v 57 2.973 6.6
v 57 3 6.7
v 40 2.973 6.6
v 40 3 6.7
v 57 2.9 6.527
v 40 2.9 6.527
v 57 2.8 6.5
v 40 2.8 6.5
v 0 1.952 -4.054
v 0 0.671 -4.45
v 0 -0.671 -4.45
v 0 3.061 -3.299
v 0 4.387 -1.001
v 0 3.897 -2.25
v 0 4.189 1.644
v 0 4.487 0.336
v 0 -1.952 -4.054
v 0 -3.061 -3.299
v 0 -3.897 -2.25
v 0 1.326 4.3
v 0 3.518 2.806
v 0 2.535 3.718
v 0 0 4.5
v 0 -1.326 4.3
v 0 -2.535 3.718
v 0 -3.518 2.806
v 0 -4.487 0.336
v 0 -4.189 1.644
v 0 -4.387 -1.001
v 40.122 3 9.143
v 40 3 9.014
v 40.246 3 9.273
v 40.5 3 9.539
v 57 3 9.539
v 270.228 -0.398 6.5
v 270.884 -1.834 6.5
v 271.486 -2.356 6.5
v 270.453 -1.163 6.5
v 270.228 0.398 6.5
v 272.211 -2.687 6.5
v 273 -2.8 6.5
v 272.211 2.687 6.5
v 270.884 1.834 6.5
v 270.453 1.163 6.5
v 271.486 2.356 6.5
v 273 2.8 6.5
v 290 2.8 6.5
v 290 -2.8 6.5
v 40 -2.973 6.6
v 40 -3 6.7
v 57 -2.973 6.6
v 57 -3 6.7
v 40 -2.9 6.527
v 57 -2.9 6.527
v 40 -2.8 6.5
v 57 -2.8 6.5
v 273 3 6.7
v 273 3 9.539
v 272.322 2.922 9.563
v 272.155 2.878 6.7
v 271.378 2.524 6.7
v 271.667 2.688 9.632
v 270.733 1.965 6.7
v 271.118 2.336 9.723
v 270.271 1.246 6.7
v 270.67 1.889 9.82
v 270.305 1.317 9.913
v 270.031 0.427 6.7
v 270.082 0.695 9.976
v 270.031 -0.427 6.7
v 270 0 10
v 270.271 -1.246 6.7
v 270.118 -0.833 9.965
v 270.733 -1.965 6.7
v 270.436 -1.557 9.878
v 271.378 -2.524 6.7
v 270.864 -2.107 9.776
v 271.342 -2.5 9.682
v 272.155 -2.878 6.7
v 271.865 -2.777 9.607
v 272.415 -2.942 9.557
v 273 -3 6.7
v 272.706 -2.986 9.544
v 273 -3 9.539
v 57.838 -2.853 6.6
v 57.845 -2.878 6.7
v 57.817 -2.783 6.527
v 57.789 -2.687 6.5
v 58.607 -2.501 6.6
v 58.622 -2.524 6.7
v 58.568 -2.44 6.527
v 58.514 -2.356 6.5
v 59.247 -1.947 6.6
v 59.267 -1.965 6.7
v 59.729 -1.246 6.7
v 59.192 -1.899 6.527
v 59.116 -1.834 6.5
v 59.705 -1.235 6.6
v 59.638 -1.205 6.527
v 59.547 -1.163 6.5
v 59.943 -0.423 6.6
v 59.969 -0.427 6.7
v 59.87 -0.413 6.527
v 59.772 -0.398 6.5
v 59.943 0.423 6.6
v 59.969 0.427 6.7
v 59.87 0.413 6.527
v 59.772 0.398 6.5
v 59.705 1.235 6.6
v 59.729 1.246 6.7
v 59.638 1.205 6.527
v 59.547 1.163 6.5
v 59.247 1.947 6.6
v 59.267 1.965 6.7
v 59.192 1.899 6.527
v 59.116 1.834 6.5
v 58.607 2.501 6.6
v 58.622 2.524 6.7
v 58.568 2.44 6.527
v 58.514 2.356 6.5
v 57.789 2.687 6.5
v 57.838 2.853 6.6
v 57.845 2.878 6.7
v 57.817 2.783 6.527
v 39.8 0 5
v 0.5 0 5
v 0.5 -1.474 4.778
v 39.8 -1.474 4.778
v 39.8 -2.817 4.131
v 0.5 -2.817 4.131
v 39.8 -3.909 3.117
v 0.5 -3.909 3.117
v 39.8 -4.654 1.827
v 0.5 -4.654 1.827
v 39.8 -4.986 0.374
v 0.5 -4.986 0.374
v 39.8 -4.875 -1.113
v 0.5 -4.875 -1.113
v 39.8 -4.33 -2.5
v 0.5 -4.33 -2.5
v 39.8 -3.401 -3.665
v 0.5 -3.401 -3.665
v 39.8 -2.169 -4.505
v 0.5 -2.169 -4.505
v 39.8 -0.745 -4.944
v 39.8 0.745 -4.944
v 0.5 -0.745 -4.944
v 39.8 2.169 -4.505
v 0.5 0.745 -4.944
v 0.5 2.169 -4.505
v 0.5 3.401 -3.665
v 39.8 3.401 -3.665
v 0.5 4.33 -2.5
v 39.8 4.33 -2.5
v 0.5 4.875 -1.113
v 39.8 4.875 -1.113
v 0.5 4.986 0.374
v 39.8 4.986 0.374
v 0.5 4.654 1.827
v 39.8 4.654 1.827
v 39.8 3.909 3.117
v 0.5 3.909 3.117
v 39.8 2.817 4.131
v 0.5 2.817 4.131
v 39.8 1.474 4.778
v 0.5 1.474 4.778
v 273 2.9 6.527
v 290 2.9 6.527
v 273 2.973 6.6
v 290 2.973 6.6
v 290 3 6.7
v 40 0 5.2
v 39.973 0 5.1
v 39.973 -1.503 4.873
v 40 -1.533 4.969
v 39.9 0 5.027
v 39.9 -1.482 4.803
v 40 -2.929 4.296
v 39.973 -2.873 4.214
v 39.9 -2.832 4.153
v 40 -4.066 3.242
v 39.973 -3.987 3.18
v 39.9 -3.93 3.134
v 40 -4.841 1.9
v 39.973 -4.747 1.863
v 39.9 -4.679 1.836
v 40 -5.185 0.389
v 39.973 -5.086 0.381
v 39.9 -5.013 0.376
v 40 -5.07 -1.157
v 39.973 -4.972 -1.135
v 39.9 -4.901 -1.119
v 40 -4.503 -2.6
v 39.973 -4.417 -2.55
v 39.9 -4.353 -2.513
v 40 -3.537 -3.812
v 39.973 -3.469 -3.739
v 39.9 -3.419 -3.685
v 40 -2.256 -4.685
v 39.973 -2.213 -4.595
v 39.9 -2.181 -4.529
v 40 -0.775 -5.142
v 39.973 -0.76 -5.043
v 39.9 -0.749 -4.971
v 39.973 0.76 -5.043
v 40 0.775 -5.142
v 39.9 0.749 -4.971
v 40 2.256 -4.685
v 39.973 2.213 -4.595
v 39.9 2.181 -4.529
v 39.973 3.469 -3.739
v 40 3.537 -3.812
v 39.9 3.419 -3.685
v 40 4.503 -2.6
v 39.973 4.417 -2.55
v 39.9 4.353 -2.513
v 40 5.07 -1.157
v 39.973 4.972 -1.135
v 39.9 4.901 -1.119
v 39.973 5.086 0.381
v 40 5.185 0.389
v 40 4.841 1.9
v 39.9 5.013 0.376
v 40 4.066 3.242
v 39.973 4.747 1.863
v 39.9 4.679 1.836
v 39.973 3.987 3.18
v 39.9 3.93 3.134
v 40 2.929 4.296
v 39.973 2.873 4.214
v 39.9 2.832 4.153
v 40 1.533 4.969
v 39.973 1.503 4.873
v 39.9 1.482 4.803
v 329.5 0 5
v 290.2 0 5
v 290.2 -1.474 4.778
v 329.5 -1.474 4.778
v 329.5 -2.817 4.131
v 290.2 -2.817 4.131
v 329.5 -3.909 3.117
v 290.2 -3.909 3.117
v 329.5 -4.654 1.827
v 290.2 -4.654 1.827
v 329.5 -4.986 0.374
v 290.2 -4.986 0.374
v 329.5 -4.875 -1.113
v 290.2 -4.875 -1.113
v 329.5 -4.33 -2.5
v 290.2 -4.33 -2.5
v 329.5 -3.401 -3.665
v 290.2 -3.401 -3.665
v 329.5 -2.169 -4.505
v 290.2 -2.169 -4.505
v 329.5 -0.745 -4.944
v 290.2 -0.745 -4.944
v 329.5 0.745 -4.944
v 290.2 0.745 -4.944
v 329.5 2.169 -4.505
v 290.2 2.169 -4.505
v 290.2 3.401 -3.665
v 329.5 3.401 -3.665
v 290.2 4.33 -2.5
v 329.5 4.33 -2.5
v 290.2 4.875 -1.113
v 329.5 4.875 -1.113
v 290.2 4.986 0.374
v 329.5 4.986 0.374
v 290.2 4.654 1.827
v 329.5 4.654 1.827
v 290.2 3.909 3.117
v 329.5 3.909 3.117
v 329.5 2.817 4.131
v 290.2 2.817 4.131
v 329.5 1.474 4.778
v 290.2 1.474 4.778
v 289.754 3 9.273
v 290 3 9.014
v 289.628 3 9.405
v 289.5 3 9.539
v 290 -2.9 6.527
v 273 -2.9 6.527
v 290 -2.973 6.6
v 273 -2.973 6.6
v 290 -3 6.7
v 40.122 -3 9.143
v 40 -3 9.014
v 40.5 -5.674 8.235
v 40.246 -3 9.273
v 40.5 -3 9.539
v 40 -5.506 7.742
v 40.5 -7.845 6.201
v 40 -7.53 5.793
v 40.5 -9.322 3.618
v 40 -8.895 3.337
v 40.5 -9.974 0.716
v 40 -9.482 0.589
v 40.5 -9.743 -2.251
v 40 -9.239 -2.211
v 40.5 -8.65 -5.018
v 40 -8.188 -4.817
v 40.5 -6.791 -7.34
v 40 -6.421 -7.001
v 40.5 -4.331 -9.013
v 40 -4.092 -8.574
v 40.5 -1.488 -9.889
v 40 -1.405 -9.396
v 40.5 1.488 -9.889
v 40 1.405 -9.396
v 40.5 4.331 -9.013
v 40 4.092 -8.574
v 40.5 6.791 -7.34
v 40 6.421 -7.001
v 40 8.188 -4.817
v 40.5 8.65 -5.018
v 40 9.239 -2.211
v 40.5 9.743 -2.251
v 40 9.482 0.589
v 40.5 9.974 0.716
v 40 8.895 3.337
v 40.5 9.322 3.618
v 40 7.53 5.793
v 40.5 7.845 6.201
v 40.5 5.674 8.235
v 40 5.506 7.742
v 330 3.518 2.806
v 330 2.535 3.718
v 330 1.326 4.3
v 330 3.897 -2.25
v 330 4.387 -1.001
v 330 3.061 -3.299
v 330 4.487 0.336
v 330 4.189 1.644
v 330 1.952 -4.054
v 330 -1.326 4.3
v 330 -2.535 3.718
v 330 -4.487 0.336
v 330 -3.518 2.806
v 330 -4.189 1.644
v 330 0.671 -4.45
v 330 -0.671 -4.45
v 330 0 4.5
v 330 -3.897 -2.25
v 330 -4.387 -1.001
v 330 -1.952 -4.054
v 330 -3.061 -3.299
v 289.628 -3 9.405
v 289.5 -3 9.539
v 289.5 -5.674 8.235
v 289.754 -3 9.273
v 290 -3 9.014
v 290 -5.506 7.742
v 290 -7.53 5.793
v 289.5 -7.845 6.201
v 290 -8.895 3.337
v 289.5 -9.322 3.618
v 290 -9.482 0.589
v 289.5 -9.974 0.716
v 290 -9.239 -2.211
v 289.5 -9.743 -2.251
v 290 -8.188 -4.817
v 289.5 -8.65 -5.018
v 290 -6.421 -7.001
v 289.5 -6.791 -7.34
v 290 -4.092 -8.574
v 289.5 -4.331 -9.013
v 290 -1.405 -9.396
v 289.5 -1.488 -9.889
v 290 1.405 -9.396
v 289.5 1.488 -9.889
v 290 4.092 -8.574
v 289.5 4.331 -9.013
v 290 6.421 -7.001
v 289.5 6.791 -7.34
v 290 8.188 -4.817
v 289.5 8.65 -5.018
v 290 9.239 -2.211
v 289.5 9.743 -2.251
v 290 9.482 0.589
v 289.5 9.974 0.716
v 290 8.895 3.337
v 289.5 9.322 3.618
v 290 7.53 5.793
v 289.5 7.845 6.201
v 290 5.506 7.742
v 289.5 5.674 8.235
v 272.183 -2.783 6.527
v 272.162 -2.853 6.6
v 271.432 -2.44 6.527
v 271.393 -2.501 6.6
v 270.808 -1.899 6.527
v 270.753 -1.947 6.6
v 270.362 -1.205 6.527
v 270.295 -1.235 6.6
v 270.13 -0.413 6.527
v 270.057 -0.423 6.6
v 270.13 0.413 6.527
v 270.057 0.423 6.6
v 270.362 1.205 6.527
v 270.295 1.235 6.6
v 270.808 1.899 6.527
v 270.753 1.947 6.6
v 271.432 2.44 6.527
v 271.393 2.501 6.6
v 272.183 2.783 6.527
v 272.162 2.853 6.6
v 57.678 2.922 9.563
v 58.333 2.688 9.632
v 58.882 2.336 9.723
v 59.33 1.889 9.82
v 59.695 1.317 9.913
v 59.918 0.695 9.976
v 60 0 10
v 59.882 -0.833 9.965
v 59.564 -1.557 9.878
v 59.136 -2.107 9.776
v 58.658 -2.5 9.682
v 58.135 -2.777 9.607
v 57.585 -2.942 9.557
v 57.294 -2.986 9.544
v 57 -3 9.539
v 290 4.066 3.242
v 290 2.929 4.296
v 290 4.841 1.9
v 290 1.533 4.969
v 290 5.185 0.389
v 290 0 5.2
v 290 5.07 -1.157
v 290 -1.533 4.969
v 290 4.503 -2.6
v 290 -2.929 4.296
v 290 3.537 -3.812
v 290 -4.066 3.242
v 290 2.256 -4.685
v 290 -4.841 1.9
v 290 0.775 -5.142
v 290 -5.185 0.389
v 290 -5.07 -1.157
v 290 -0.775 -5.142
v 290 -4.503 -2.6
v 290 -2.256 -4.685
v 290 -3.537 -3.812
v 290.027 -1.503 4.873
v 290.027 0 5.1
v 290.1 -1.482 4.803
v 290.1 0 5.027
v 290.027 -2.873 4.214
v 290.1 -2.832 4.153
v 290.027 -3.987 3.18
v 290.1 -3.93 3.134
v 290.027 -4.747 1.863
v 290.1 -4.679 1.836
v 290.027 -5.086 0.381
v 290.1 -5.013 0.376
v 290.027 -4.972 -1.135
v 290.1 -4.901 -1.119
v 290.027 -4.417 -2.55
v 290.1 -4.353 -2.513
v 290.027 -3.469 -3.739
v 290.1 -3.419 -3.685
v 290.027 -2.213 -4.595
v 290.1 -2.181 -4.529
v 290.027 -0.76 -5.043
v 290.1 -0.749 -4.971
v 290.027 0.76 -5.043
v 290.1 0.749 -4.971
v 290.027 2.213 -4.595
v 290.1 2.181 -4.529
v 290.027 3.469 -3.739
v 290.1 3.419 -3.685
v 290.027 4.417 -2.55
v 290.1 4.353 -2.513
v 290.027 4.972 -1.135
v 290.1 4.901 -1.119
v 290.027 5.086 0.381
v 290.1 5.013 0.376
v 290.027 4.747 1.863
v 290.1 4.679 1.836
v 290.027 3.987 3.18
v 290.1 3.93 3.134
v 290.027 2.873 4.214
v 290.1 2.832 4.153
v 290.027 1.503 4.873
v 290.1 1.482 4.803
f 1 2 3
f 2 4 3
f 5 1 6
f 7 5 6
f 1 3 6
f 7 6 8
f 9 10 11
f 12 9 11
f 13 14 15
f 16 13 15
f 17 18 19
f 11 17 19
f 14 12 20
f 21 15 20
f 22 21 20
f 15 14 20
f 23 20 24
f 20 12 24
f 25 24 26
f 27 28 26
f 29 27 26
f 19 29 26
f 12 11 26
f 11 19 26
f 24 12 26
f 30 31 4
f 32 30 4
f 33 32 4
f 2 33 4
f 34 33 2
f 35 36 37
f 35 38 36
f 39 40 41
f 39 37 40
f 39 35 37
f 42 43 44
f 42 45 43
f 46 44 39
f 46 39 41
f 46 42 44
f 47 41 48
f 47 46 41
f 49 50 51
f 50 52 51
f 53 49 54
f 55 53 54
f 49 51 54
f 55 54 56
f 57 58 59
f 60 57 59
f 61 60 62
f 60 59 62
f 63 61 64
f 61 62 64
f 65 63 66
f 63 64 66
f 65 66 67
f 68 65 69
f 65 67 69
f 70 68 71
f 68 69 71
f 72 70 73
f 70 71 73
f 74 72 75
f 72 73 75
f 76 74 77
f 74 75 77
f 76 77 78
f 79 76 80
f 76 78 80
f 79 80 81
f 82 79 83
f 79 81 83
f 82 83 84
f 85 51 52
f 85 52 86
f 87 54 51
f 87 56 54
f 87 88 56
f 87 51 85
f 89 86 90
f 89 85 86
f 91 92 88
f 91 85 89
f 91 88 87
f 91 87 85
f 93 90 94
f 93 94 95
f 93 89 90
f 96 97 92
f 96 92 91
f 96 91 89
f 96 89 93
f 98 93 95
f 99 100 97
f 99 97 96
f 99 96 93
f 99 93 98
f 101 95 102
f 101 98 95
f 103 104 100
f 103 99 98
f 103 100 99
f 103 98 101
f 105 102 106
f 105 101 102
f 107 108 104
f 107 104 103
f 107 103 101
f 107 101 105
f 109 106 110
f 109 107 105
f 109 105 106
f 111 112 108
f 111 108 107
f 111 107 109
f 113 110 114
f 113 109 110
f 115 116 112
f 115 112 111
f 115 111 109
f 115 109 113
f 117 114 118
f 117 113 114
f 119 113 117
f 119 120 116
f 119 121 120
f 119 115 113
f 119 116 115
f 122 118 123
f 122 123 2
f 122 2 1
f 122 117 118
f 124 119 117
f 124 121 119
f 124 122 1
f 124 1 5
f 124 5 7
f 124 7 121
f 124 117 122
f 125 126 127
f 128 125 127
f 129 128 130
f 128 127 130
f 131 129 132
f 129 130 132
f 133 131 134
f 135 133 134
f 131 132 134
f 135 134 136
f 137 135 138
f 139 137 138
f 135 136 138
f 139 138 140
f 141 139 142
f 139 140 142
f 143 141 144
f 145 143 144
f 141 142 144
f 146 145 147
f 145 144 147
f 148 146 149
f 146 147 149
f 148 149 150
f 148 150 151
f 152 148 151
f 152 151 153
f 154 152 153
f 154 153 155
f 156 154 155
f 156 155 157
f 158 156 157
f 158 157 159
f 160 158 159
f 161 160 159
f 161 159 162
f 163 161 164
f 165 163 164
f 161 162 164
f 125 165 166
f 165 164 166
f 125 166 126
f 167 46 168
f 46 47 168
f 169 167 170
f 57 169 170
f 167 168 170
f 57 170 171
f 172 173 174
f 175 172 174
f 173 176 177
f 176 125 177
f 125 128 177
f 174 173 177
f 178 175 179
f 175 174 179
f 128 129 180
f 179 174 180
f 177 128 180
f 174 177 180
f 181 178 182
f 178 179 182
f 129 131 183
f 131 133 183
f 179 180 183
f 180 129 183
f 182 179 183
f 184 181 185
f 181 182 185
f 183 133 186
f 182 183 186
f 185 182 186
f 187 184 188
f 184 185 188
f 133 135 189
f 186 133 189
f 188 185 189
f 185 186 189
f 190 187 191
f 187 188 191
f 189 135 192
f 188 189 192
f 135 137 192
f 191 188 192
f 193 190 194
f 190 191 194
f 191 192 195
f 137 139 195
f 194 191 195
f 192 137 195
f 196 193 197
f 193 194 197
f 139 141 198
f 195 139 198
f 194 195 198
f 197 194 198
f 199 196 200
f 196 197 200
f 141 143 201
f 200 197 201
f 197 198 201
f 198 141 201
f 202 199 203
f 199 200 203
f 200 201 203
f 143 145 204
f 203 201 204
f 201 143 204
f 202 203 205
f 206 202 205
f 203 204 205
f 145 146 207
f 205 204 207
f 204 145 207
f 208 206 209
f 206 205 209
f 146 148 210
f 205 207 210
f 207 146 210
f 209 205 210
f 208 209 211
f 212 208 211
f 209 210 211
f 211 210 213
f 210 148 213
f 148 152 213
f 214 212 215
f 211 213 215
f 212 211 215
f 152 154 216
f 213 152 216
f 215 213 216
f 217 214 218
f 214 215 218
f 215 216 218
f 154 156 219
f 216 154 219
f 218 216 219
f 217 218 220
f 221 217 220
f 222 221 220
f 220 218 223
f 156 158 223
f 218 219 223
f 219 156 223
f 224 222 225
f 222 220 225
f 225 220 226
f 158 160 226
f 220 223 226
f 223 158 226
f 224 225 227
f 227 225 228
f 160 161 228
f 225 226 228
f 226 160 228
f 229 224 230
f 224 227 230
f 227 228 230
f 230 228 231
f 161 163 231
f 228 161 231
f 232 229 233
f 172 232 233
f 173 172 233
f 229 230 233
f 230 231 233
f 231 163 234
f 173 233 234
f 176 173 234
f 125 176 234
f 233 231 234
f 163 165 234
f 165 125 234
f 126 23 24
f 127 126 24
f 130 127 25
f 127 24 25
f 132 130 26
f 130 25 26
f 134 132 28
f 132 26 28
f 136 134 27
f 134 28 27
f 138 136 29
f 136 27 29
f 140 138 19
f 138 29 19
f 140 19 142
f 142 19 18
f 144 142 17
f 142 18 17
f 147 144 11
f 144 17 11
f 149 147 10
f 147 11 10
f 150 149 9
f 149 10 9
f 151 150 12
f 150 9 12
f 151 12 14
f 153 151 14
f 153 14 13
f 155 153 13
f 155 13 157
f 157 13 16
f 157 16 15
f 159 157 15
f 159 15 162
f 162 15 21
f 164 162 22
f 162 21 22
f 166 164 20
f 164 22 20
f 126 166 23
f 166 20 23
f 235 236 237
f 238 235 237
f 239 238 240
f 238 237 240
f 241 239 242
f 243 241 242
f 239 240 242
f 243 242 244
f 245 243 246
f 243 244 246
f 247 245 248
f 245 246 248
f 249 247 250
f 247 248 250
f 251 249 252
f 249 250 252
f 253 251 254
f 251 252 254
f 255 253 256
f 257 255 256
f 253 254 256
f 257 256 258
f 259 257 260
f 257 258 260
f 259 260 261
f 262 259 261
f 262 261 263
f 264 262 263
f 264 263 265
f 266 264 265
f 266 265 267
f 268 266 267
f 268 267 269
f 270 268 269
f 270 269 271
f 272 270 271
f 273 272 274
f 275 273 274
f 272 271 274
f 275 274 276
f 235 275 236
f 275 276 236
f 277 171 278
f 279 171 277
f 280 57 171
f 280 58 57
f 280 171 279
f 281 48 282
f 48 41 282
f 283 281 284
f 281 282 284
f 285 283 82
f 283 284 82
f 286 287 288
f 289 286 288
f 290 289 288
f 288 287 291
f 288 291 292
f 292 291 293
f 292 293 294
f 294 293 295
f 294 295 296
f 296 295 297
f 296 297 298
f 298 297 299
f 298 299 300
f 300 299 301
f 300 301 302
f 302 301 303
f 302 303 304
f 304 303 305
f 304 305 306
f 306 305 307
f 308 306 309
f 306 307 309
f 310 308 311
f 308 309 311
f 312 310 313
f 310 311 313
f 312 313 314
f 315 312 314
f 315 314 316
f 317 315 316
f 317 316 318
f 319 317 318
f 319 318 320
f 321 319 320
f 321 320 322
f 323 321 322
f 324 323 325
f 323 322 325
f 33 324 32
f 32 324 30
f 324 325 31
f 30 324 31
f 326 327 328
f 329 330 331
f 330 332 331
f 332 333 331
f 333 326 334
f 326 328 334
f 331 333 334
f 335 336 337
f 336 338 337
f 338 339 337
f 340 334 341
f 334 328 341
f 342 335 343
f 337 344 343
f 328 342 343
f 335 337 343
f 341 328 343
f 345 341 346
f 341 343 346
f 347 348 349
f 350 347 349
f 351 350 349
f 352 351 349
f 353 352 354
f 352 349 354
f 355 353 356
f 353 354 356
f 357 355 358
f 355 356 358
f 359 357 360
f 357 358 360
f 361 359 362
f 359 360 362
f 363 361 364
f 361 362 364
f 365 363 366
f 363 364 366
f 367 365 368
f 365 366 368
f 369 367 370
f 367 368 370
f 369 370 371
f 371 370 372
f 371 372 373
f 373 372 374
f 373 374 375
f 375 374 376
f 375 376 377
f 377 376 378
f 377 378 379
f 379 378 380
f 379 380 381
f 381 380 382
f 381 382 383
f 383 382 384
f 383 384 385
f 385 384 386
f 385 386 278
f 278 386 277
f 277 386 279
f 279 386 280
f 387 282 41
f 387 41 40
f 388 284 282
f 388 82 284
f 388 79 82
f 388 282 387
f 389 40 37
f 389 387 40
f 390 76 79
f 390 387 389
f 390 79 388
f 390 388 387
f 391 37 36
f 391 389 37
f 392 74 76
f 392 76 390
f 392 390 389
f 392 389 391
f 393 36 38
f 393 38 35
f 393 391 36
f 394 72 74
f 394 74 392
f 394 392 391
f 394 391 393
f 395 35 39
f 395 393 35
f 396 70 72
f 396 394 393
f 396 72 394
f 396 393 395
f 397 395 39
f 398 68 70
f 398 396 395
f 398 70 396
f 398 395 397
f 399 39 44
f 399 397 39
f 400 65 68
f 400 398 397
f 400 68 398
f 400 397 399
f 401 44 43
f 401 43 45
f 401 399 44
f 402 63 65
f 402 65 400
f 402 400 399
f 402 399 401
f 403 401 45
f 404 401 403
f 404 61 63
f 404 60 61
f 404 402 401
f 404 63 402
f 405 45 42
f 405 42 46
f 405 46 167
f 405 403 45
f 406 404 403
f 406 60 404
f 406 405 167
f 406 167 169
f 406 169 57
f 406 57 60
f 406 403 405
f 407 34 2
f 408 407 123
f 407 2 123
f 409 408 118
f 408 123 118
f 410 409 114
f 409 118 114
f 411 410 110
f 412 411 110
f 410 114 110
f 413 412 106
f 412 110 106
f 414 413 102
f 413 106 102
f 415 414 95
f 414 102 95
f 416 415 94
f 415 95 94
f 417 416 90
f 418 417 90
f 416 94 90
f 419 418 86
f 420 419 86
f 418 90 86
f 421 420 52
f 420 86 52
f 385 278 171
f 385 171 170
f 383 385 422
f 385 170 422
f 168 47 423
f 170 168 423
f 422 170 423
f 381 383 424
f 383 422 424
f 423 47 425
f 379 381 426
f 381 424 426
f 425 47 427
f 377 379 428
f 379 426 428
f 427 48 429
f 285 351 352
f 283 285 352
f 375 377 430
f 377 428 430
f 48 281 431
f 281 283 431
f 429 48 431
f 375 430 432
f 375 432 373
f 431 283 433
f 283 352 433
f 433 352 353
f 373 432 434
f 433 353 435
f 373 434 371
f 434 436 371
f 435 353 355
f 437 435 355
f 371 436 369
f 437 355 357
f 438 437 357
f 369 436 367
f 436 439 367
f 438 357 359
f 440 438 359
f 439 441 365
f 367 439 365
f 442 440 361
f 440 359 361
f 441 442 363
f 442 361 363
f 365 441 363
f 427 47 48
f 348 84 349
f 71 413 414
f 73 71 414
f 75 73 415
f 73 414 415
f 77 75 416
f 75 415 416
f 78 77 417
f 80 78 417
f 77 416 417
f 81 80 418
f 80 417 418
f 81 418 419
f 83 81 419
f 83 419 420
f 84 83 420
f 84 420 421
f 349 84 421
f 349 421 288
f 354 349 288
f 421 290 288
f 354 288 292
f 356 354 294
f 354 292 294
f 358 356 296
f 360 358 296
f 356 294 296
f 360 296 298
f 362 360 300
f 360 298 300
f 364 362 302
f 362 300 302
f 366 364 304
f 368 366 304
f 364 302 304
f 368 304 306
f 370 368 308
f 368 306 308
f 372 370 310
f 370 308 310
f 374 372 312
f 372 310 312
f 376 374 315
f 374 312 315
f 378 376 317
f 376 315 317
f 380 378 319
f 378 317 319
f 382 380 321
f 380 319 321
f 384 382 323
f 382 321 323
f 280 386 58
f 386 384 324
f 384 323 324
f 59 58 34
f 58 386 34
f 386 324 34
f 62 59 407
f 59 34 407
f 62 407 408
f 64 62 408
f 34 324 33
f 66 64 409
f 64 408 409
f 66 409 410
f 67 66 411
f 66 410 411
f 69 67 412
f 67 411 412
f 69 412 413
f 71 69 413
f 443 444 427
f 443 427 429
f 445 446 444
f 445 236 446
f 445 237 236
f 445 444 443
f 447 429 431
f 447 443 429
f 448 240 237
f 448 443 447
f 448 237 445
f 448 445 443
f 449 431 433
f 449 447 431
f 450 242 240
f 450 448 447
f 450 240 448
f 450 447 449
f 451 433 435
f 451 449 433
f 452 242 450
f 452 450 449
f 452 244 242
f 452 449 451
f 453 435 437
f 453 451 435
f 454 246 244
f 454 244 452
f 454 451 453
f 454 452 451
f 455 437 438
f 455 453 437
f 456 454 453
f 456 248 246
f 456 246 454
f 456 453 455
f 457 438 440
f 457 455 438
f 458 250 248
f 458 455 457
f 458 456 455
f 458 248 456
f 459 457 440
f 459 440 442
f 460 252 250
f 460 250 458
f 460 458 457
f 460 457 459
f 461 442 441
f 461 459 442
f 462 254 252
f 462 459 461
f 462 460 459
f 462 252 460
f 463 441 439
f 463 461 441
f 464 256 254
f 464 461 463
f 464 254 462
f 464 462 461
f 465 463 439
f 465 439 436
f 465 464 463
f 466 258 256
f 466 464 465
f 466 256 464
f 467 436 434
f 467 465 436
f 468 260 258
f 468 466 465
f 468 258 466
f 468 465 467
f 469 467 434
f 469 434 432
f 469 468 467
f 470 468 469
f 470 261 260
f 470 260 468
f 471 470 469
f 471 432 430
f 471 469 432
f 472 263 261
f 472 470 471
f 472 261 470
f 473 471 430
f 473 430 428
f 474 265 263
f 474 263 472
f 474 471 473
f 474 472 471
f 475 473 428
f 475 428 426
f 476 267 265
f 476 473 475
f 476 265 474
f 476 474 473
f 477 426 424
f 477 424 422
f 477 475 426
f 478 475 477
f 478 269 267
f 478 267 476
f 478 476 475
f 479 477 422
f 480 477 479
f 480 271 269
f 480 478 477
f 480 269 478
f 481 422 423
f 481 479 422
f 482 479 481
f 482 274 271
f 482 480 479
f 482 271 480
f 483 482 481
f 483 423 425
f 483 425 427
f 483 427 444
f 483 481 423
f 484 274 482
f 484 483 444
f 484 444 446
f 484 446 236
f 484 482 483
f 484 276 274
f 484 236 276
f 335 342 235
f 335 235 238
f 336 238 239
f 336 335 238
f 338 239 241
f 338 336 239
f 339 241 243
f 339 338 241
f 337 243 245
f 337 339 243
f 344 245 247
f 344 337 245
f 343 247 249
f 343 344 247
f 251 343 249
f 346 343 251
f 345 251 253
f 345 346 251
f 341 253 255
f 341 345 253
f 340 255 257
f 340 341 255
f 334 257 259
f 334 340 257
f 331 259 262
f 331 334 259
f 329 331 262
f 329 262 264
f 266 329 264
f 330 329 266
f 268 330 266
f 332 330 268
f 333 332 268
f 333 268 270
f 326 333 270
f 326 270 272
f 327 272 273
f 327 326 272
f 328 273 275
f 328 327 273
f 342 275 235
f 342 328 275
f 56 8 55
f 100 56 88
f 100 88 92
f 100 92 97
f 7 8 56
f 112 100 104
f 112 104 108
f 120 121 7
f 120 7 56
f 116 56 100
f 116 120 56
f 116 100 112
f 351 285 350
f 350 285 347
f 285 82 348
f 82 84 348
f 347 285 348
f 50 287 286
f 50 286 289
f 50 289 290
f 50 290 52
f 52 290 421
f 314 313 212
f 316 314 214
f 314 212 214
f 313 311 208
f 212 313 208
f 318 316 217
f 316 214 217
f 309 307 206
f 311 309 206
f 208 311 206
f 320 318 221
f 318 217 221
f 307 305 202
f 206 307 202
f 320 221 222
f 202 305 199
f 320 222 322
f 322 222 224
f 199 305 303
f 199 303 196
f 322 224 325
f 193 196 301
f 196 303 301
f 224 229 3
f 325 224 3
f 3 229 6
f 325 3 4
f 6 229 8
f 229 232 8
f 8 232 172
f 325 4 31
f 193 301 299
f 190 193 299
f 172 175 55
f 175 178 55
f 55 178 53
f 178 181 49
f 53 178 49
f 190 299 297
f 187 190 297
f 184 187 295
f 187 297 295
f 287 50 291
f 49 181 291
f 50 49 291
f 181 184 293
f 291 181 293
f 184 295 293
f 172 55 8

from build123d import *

# Parameters (mm, degrees)
CHAMFER1_SIZE       = 0.5
CHAMFER2_SIZE       = 0.5
CHAMFER3_SIZE       = 0.5
CHAMFER4_SIZE       = 0.5
FILLET1_R           = 0.2
FILLET2_R           = 0.2
SKETCH4_W           = 23
SKETCH4_H           = 6
BOSS_EXTRUDE3_DEPTH = 3.5
SKETCH5_W           = 23
SKETCH5_H           = 6
BOSS_EXTRUDE4_DEPTH = 3.5
FILLET6_RADIUS      = 3
FILLET6_LENGTH      = 3.5
FILLET7_RADIUS      = 3
FILLET7_LENGTH      = 3.5
FILLET8_R           = 0.2
FILLET9_RADIUS      = 3
FILLET9_LENGTH      = 3.5
FILLET10_RADIUS     = 3
FILLET10_LENGTH     = 3.5
FILLET11_R          = 0.2


with BuildPart() as part:
    # Sketch1 → Revolve1 (revolve)
    with BuildSketch(Plane.XY, mode=Mode.PRIVATE) as revolve1_sk:
        Polygon((0, 0), (330, 0), (330, 5), (290, 5), (290, 10), (40, 10), (40, 5), (0, 5), align=None)
    revolve(revolve1_sk.sketch.rotate(Axis((0, 0, 0), (1, 0, 0)), 90), axis=Axis((0, 0, 0), (1, 0, 0)))

    # Chamfer1
    chamfer1_edges = [part.edges().sort_by_distance(p)[0] for p in [
        (290, 0, -10),
    ]]
    chamfer(chamfer1_edges, length=CHAMFER1_SIZE)

    # Chamfer2
    chamfer2_edges = [part.edges().sort_by_distance(p)[0] for p in [
        (40, 0, -10),
    ]]
    chamfer(chamfer2_edges, length=CHAMFER2_SIZE)

    # Chamfer3
    chamfer3_edges = [part.edges().sort_by_distance(p)[0] for p in [
        (0, 0, -5),
    ]]
    chamfer(chamfer3_edges, length=CHAMFER3_SIZE)

    # Chamfer4
    chamfer4_edges = [part.edges().sort_by_distance(p)[0] for p in [
        (330, 0, -5),
    ]]
    chamfer(chamfer4_edges, length=CHAMFER4_SIZE)

    # Fillet1
    fillet1_edges = [part.edges().sort_by_distance(p)[0] for p in [
        (40, 0, -5),
    ]]
    fillet(fillet1_edges, radius=FILLET1_R)

    # Fillet2
    fillet2_edges = [part.edges().sort_by_distance(p)[0] for p in [
        (290, 0, -5),
    ]]
    fillet(fillet2_edges, radius=FILLET2_R)


with BuildPart() as body_2:
    # Sketch4 → Boss-Extrude3 (new body)
    with BuildSketch(Plane.XY.offset(10)):
        with Locations((48.5, 0)):
            Rectangle(SKETCH4_W, SKETCH4_H)
    extrude(amount=-BOSS_EXTRUDE3_DEPTH)

    # Fillet6: full round fillet: the end face becomes a half cylinder, R = half its width
    fillet6_face = Plane((37, 0, 8.25), x_dir=(0, 0, 1), z_dir=(-1, 0, 0))  # on the end face: x along it, z out of the body
    fillet6_slab = fillet6_face.offset(-FILLET6_RADIUS / 2) * Box(FILLET6_LENGTH, 2 * FILLET6_RADIUS, FILLET6_RADIUS, mode=Mode.PRIVATE)  # the body's end, R deep
    fillet6_round = Plane((40, 0, 8.25), x_dir=(-1, 0, 0), z_dir=(0, 0, 1)) * Cylinder(FILLET6_RADIUS, FILLET6_LENGTH, mode=Mode.PRIVATE)  # its axis R under the face
    add(fillet6_slab - fillet6_round, mode=Mode.SUBTRACT)

    # Fillet7: full round fillet: the end face becomes a half cylinder, R = half its width
    fillet7_face = Plane((60, 0, 8.25), x_dir=(0, 0, -1), z_dir=(1, 0, 0))  # on the end face: x along it, z out of the body
    fillet7_slab = fillet7_face.offset(-FILLET7_RADIUS / 2) * Box(FILLET7_LENGTH, 2 * FILLET7_RADIUS, FILLET7_RADIUS, mode=Mode.PRIVATE)  # the body's end, R deep
    fillet7_round = Plane((57, 0, 8.25), x_dir=(1, 0, 0), z_dir=(0, 0, -1)) * Cylinder(FILLET7_RADIUS, FILLET7_LENGTH, mode=Mode.PRIVATE)  # its axis R under the face
    add(fillet7_slab - fillet7_round, mode=Mode.SUBTRACT)

    # Fillet8
    fillet8_edges = [body_2.edges().sort_by_distance(p)[0] for p in [
        (48.5, -3, 6.5),
        (37, 0, 6.5),
        (48.5, 3, 6.5),
        (60, 0, 6.5),
    ]]
    fillet(fillet8_edges, radius=FILLET8_R)


with BuildPart() as body_3:
    # Sketch5 → Boss-Extrude4 (new body)
    with BuildSketch(Plane.XY.offset(10)):
        with Locations((281.5, 0)):
            Rectangle(SKETCH5_W, SKETCH5_H)
    extrude(amount=-BOSS_EXTRUDE4_DEPTH)

    # Fillet9: full round fillet: the end face becomes a half cylinder, R = half its width
    fillet9_face = Plane((293, 0, 8.25), x_dir=(0, 0, 1), z_dir=(1, 0, 0))  # on the end face: x along it, z out of the body
    fillet9_slab = fillet9_face.offset(-FILLET9_RADIUS / 2) * Box(FILLET9_LENGTH, 2 * FILLET9_RADIUS, FILLET9_RADIUS, mode=Mode.PRIVATE)  # the body's end, R deep
    fillet9_round = Plane((290, 0, 8.25), x_dir=(1, 0, 0), z_dir=(0, 0, 1)) * Cylinder(FILLET9_RADIUS, FILLET9_LENGTH, mode=Mode.PRIVATE)  # its axis R under the face
    add(fillet9_slab - fillet9_round, mode=Mode.SUBTRACT)

    # Fillet10: full round fillet: the end face becomes a half cylinder, R = half its width
    fillet10_face = Plane((270, 0, 8.25), x_dir=(0, 0, 1), z_dir=(-1, 0, 0))  # on the end face: x along it, z out of the body
    fillet10_slab = fillet10_face.offset(-FILLET10_RADIUS / 2) * Box(FILLET10_LENGTH, 2 * FILLET10_RADIUS, FILLET10_RADIUS, mode=Mode.PRIVATE)  # the body's end, R deep
    fillet10_round = Plane((273, 0, 8.25), x_dir=(-1, 0, 0), z_dir=(0, 0, 1)) * Cylinder(FILLET10_RADIUS, FILLET10_LENGTH, mode=Mode.PRIVATE)  # its axis R under the face
    add(fillet10_slab - fillet10_round, mode=Mode.SUBTRACT)

    # Fillet11
    fillet11_edges = [body_3.edges().sort_by_distance(p)[0] for p in [
        (281.5, 3, 6.5),
        (293, 0, 6.5),
        (281.5, -3, 6.5),
        (270, 0, 6.5),
    ]]
    fillet(fillet11_edges, radius=FILLET11_R)


with BuildPart() as part_1:
    add(part.part)

    # Combine2: cut body 2, body 3
    add(body_2.part, mode=Mode.SUBTRACT)
    add(body_3.part, mode=Mode.SUBTRACT)


solid = part_1.part
